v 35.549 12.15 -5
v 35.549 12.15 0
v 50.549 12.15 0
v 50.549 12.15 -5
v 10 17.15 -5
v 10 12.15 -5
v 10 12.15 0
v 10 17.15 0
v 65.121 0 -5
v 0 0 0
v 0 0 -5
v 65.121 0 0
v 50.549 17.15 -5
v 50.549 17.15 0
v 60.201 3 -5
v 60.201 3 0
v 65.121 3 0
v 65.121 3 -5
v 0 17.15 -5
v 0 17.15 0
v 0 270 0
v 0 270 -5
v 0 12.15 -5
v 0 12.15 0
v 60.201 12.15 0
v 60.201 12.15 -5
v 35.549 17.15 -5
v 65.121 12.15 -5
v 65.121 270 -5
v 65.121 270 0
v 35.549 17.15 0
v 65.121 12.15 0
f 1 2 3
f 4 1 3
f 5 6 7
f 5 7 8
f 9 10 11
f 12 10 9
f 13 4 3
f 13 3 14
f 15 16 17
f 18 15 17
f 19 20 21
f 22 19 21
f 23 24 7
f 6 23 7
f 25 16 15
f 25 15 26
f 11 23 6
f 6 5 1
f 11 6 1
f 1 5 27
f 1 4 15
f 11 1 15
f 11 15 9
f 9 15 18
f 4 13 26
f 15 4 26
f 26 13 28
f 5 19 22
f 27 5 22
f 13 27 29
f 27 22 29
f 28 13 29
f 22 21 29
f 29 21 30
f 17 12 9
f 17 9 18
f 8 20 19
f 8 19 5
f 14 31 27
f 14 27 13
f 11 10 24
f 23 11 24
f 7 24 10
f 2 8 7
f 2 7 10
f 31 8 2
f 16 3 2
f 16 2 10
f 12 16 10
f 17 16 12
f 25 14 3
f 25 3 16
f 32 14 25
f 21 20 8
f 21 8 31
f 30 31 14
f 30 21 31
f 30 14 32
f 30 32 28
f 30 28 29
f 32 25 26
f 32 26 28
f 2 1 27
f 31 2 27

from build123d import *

# Parameters (mm, degrees)
ESQUISSE1_W             = 65.121094869
ESQUISSE1_H             = 270
BOSS_EXTRU_1_DEPTH      = 5
ESQUISSE2_W             = 10
ESQUISSE2_H             = 5
ESQUISSE2_W_2           = 15
ESQUISSE2_W_3           = 4.92
ESQUISSE2_H_2           = 9.15
ENL_V_MAT_EXTRU_1_DEPTH = 5


with BuildPart() as part:
    # Esquisse1 → Boss.-Extru.1 (new body)
    with BuildSketch(Plane.XY):
        with Locations((32.560547435, 135)):
            Rectangle(ESQUISSE1_W, ESQUISSE1_H)
    extrude(amount=-BOSS_EXTRU_1_DEPTH)

    # Esquisse2 → Enlèv. mat.-Extru.1 (cut)
    with BuildSketch(Plane.XY):
        with Locations((5, 14.65)):
            Rectangle(ESQUISSE2_W, ESQUISSE2_H)
        with Locations((43.049292824, 14.65)):
            Rectangle(ESQUISSE2_W_2, ESQUISSE2_H)
        with Locations((62.661094869, 7.575)):
            Rectangle(ESQUISSE2_W_3, ESQUISSE2_H_2)
    extrude(amount=-ENL_V_MAT_EXTRU_1_DEPTH, mode=Mode.SUBTRACT)


solid = part.part
